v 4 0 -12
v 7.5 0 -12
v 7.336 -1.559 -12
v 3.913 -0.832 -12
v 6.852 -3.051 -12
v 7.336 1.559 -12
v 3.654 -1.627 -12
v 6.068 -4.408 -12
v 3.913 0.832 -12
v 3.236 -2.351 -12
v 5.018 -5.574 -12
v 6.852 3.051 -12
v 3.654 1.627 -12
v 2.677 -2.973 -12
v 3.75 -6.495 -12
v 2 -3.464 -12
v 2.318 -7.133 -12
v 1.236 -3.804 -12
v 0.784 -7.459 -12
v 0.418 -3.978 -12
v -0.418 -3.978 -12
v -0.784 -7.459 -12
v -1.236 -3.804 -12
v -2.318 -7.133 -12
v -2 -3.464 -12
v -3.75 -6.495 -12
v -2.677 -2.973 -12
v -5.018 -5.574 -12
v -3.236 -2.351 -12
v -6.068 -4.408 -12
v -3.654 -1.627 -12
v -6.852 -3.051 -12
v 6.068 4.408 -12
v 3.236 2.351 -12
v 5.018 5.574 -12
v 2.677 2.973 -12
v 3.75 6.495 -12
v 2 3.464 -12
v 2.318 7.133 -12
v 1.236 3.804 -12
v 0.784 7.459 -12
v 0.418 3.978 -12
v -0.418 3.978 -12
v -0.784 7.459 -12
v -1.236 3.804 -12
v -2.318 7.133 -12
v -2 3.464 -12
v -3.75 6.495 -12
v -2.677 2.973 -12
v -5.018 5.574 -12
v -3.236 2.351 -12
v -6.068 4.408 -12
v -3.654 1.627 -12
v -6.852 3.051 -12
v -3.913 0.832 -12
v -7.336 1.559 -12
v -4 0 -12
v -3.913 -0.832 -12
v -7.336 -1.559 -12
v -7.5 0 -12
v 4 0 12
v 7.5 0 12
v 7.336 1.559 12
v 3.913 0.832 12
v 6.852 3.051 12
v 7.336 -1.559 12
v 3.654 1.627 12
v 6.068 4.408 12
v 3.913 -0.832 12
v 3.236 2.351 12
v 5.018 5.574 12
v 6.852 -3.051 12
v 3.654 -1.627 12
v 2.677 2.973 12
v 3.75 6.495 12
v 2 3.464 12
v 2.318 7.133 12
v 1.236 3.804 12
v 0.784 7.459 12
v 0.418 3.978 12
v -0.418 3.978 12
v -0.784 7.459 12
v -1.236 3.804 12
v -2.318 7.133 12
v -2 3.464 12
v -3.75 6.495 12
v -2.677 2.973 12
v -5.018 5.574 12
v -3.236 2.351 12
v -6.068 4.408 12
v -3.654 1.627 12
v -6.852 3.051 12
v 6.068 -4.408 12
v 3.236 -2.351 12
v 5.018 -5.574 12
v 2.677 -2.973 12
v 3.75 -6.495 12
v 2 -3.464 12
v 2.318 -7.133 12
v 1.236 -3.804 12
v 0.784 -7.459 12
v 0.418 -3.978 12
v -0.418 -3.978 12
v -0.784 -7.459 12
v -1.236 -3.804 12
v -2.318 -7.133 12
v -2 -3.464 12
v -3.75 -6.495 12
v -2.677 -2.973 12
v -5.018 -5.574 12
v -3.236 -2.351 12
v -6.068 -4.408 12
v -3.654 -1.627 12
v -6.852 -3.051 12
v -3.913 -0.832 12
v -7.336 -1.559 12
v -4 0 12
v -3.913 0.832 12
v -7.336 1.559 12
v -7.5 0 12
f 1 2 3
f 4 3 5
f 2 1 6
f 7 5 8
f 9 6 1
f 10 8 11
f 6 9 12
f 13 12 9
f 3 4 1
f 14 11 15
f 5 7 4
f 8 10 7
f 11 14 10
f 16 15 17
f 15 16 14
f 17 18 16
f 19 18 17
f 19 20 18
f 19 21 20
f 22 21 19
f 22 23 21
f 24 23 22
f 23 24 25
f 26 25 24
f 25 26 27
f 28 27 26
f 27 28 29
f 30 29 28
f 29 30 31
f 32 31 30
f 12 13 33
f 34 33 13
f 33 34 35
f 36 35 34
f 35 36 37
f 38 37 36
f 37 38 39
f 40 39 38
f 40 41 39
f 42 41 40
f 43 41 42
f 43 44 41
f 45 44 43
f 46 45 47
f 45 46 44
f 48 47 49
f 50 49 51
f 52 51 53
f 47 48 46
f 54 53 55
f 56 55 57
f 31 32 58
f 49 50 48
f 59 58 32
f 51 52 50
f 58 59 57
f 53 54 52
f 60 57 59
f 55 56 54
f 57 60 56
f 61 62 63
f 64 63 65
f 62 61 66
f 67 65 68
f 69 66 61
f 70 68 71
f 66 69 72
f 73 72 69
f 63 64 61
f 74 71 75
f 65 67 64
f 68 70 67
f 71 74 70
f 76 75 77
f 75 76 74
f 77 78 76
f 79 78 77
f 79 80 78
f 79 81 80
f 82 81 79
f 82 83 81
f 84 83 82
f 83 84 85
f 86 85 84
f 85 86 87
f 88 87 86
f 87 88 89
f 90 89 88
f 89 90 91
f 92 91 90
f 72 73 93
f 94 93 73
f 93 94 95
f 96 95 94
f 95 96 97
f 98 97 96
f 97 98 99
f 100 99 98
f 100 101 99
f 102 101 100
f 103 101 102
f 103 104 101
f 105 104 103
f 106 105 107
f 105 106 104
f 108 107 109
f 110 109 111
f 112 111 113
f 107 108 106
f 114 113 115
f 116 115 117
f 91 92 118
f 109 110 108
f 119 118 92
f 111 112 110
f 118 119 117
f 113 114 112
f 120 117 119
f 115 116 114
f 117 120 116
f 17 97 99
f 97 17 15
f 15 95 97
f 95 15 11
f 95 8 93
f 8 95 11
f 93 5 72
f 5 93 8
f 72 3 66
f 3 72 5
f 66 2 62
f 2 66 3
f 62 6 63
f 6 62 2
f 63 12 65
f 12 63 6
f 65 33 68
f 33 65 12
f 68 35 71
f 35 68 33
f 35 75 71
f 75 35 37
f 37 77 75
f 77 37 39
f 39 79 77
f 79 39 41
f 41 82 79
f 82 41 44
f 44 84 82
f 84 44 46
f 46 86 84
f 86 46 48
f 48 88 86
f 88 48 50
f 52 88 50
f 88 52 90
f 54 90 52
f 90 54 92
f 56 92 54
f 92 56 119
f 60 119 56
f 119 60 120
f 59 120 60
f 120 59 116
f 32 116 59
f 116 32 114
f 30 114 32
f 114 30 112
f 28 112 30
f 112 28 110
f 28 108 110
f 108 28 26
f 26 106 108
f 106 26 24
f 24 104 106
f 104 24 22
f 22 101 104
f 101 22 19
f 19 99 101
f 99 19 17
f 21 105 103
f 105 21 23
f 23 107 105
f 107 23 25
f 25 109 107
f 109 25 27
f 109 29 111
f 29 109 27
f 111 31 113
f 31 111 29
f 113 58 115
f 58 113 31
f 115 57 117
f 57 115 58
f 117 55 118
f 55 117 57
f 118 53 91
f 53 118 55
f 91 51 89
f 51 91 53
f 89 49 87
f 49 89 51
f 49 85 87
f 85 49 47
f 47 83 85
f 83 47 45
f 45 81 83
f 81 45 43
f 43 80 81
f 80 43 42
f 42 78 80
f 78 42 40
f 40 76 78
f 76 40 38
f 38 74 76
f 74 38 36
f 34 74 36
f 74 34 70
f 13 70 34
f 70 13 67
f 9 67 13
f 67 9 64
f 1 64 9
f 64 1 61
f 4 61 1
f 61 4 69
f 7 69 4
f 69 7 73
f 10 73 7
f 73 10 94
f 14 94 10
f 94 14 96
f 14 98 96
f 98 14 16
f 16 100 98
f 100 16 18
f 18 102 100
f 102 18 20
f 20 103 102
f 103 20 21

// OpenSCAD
// file: ../press_fit.scad
include <config.scad>

module press_fit(d=0, h=0, center=false) {

	linear_extrude(height=h, center=center)
		minkowski() {
			square([d/3,d/3], center=true);
			circle(r=d/3);
		}
}

difference() {
	press_fit(d=20, h=24, center=true);
	cylinder(d=20, h=24+e, center=true);
}
// file: ../standard.scad
BOLT_D = [
	-1, //0 index is not used but reduces computation
	-1,
	-1,
	2.980,	//m3
	3.978,	//m4
	4.976,	//m5
	5.974,	//m6
	-1,
	7.972,	//m8
	-1,
	9.968,	//m10
	-1,
	11.966	//m12
];

NUT_D = [
	-1, //0 index is not used but reduces computation
	-1,
	-1,
	6.40,	//m3
	8.10,	//m4
	9.20,	//m5
	11.50,	//m6
	-1,
	15.00,	//m8
	-1,
	19.60,	//m10
	-1,
	22.10	//m12
];

NUT_H = [
	-1, //0 index is not used but reduces computation
	-1,
	-1,
	2.40,	//m3
	3.20,	//m4
	4.00,	//m5
	5.00,	//m6
	-1,
	6.50,	//m8
	-1,
	8.00,	//m10
	-1,
	10.00	//m12
];

NEMA_F = [	//faceplate size
	-1,-1,-1,-1,-1,-1,-1,-1,-1,-1,-1,
	28.0,	//Nema11
	-1,-1,
	35.6,	//Nema14
	-1,-1,
	42.3,	//Nema17
	-1,-1,-1,-1,-1,
	58.4	//Nema23
];

NEMA_H = [	//halved distance between holes
	-1,-1,-1,-1,-1,-1,-1,-1,-1,-1,-1,
	11.50,	//Nema11
	-1,-1,
	13.00,	//Nema14
	-1,-1,
	15.50,	//Nema17
	-1,-1,-1,-1,-1,
	23.57	//Nema23
];

NEMA_S = [	//shaft diameter
	-1,-1,-1,-1,-1,-1,-1,-1,-1,-1,-1,
	4.0,	//Nema11
	-1,-1,
	5.0,	//Nema14
	-1,-1,
	5.0,	//Nema17
	-1,-1,-1,-1,-1,
	6.35	//Nema23
];
// file: ../config.scad
include <standard.scad>

//render & print
$fs=.5;						//minimum arc segment
e=.1;						//extra length for manfold mesh (do not change)
tol=.5;						//xy compensation for small holes

				//
x=50*cos($t*360);			// printhead position
y=40*sin($t*360);			//
z=50*sin($t*360);

/*
x=0;			// printhead position
y=0;			//
z=0;
*/

wall=5/2;					//(some) thin wall thickness

//frame
f_t=10;						//frame thickness
f_x=200;
f_y=200;
f_z=65;
f_tr=8;						//corner threaded rods ISO diameter 
fy_ko=2;					//keepout between frame and x_carriage

//microswitch
ms_h=6;						//height
ms_l=13;					//length
ms_t=6;						//thickness

//motors
ab_motor=17;				//xy motors
ab_motor_l=47;				//xy motors length
z_motor=17;					//z motor
z_motor_l=47;				//z motor length
z_h=100;
z_h_extra=16.5;

//x
x_d=15;						//bearing diameter
x_l=24;						//bearing length
x_s=8;						//shaft diameter
x_fan=30;					//hotend fan diameter
x_blower=35;				//blower fan diameter
x_fans_m=6;					//fan and blower mount holes spacing

x_fan_duct=28;
x_blower_duct=25;
x_shroud=10;
x_shroud_t=5;
x_shroud_w=2;


//y
y_d=15;						//bearing diameter
y_l=24;						//bearing length
y_s=8;						//shaft diameter
y_shaft_distance_extra=3;	//extra distance between shafts
y_sp=6;						//shaft position (relative to frame)


//z
z_s=8;						//shaft diameter
z_l=24*2;					//bearing length
z_d=15;						//bearing diameter


//idler
idler_d=8;					//groove bearing OD
idler_l=3;					//groove bearing thickness
idler_s=3;					//groove bearing ID

idler_hk=2;					//idler horizontal keepout
idler_vk=.5;				//idler verical keepout (washer thickness?)

//pulley
pulley_d=200/PI/5;			//5 steps per mm (80 with 16x microstepping)
pulley_h=2;
pulley_rivet=1.5;
pulley_flat_shaft=true;

//bed
bed_x=100;
bed_y=100;

// ------
//  math
// ------
pulley_length = pulley_h+4*pulley_rivet+NUT_D[3];
pulley_diameter = pulley_d+pulley_rivet*2;
pulley_wire_height = pulley_h/2+pulley_rivet*2+NUT_D[3];
pulley_screw_length = (pulley_diameter-NEMA_S[17])/2;

y_shaft_distance = NEMA_F[ab_motor]+y_s+y_shaft_distance_extra;

x_shaft_distance = y_shaft_distance-y_d-y_s;

ab_motor_xpos = f_x/2-f_t-y_sp-y_d/2-wall;
ab_motor_ypos = f_y/2-f_t-(NEMA_H[ab_motor]*2+BOLT_D[3])/2+(f_t-f_tr)/2;


z_shaft_distance = bed_x/2-wall;
z_carriage_arm = NEMA_F[ab_motor]/2+y_l/2+x_d/2+wall+x_fan/2;
z_carriage_arm_max = ab_motor_ypos+f_y/2-f_t-x_fan/2;

//COLORS
abs="OrangeRed";
pla="SteelBlue";
shaft="DarkGray";
fan=[.1, .1, .1];
mdf="BurlyWood";

abs_="LightSteelBlue";
bearing_inside=fan;
bearing_outside=shaft;
blower=fan;
e3d="Silver";
heatbed="Silver";
th_rods=shaft;
nema_body=fan;
nema_plate=shaft;


use <press_fit.scad>
// main file
include <../config.scad>


module bearing (od,id,l,center=false) {
	
		color(bearing_outside)
			linear_extrude(height=l, center=center)
				difference() {
					circle(d=od);
					circle(d=od-1.2*2);
				}
				
		color(bearing_inside)
			linear_extrude(height=l, center=center)
				difference() {
					circle(d=od-1.2*2);
					circle(d=id);
				}
}

bearing(od=15, id=8, l=24, center=true);
